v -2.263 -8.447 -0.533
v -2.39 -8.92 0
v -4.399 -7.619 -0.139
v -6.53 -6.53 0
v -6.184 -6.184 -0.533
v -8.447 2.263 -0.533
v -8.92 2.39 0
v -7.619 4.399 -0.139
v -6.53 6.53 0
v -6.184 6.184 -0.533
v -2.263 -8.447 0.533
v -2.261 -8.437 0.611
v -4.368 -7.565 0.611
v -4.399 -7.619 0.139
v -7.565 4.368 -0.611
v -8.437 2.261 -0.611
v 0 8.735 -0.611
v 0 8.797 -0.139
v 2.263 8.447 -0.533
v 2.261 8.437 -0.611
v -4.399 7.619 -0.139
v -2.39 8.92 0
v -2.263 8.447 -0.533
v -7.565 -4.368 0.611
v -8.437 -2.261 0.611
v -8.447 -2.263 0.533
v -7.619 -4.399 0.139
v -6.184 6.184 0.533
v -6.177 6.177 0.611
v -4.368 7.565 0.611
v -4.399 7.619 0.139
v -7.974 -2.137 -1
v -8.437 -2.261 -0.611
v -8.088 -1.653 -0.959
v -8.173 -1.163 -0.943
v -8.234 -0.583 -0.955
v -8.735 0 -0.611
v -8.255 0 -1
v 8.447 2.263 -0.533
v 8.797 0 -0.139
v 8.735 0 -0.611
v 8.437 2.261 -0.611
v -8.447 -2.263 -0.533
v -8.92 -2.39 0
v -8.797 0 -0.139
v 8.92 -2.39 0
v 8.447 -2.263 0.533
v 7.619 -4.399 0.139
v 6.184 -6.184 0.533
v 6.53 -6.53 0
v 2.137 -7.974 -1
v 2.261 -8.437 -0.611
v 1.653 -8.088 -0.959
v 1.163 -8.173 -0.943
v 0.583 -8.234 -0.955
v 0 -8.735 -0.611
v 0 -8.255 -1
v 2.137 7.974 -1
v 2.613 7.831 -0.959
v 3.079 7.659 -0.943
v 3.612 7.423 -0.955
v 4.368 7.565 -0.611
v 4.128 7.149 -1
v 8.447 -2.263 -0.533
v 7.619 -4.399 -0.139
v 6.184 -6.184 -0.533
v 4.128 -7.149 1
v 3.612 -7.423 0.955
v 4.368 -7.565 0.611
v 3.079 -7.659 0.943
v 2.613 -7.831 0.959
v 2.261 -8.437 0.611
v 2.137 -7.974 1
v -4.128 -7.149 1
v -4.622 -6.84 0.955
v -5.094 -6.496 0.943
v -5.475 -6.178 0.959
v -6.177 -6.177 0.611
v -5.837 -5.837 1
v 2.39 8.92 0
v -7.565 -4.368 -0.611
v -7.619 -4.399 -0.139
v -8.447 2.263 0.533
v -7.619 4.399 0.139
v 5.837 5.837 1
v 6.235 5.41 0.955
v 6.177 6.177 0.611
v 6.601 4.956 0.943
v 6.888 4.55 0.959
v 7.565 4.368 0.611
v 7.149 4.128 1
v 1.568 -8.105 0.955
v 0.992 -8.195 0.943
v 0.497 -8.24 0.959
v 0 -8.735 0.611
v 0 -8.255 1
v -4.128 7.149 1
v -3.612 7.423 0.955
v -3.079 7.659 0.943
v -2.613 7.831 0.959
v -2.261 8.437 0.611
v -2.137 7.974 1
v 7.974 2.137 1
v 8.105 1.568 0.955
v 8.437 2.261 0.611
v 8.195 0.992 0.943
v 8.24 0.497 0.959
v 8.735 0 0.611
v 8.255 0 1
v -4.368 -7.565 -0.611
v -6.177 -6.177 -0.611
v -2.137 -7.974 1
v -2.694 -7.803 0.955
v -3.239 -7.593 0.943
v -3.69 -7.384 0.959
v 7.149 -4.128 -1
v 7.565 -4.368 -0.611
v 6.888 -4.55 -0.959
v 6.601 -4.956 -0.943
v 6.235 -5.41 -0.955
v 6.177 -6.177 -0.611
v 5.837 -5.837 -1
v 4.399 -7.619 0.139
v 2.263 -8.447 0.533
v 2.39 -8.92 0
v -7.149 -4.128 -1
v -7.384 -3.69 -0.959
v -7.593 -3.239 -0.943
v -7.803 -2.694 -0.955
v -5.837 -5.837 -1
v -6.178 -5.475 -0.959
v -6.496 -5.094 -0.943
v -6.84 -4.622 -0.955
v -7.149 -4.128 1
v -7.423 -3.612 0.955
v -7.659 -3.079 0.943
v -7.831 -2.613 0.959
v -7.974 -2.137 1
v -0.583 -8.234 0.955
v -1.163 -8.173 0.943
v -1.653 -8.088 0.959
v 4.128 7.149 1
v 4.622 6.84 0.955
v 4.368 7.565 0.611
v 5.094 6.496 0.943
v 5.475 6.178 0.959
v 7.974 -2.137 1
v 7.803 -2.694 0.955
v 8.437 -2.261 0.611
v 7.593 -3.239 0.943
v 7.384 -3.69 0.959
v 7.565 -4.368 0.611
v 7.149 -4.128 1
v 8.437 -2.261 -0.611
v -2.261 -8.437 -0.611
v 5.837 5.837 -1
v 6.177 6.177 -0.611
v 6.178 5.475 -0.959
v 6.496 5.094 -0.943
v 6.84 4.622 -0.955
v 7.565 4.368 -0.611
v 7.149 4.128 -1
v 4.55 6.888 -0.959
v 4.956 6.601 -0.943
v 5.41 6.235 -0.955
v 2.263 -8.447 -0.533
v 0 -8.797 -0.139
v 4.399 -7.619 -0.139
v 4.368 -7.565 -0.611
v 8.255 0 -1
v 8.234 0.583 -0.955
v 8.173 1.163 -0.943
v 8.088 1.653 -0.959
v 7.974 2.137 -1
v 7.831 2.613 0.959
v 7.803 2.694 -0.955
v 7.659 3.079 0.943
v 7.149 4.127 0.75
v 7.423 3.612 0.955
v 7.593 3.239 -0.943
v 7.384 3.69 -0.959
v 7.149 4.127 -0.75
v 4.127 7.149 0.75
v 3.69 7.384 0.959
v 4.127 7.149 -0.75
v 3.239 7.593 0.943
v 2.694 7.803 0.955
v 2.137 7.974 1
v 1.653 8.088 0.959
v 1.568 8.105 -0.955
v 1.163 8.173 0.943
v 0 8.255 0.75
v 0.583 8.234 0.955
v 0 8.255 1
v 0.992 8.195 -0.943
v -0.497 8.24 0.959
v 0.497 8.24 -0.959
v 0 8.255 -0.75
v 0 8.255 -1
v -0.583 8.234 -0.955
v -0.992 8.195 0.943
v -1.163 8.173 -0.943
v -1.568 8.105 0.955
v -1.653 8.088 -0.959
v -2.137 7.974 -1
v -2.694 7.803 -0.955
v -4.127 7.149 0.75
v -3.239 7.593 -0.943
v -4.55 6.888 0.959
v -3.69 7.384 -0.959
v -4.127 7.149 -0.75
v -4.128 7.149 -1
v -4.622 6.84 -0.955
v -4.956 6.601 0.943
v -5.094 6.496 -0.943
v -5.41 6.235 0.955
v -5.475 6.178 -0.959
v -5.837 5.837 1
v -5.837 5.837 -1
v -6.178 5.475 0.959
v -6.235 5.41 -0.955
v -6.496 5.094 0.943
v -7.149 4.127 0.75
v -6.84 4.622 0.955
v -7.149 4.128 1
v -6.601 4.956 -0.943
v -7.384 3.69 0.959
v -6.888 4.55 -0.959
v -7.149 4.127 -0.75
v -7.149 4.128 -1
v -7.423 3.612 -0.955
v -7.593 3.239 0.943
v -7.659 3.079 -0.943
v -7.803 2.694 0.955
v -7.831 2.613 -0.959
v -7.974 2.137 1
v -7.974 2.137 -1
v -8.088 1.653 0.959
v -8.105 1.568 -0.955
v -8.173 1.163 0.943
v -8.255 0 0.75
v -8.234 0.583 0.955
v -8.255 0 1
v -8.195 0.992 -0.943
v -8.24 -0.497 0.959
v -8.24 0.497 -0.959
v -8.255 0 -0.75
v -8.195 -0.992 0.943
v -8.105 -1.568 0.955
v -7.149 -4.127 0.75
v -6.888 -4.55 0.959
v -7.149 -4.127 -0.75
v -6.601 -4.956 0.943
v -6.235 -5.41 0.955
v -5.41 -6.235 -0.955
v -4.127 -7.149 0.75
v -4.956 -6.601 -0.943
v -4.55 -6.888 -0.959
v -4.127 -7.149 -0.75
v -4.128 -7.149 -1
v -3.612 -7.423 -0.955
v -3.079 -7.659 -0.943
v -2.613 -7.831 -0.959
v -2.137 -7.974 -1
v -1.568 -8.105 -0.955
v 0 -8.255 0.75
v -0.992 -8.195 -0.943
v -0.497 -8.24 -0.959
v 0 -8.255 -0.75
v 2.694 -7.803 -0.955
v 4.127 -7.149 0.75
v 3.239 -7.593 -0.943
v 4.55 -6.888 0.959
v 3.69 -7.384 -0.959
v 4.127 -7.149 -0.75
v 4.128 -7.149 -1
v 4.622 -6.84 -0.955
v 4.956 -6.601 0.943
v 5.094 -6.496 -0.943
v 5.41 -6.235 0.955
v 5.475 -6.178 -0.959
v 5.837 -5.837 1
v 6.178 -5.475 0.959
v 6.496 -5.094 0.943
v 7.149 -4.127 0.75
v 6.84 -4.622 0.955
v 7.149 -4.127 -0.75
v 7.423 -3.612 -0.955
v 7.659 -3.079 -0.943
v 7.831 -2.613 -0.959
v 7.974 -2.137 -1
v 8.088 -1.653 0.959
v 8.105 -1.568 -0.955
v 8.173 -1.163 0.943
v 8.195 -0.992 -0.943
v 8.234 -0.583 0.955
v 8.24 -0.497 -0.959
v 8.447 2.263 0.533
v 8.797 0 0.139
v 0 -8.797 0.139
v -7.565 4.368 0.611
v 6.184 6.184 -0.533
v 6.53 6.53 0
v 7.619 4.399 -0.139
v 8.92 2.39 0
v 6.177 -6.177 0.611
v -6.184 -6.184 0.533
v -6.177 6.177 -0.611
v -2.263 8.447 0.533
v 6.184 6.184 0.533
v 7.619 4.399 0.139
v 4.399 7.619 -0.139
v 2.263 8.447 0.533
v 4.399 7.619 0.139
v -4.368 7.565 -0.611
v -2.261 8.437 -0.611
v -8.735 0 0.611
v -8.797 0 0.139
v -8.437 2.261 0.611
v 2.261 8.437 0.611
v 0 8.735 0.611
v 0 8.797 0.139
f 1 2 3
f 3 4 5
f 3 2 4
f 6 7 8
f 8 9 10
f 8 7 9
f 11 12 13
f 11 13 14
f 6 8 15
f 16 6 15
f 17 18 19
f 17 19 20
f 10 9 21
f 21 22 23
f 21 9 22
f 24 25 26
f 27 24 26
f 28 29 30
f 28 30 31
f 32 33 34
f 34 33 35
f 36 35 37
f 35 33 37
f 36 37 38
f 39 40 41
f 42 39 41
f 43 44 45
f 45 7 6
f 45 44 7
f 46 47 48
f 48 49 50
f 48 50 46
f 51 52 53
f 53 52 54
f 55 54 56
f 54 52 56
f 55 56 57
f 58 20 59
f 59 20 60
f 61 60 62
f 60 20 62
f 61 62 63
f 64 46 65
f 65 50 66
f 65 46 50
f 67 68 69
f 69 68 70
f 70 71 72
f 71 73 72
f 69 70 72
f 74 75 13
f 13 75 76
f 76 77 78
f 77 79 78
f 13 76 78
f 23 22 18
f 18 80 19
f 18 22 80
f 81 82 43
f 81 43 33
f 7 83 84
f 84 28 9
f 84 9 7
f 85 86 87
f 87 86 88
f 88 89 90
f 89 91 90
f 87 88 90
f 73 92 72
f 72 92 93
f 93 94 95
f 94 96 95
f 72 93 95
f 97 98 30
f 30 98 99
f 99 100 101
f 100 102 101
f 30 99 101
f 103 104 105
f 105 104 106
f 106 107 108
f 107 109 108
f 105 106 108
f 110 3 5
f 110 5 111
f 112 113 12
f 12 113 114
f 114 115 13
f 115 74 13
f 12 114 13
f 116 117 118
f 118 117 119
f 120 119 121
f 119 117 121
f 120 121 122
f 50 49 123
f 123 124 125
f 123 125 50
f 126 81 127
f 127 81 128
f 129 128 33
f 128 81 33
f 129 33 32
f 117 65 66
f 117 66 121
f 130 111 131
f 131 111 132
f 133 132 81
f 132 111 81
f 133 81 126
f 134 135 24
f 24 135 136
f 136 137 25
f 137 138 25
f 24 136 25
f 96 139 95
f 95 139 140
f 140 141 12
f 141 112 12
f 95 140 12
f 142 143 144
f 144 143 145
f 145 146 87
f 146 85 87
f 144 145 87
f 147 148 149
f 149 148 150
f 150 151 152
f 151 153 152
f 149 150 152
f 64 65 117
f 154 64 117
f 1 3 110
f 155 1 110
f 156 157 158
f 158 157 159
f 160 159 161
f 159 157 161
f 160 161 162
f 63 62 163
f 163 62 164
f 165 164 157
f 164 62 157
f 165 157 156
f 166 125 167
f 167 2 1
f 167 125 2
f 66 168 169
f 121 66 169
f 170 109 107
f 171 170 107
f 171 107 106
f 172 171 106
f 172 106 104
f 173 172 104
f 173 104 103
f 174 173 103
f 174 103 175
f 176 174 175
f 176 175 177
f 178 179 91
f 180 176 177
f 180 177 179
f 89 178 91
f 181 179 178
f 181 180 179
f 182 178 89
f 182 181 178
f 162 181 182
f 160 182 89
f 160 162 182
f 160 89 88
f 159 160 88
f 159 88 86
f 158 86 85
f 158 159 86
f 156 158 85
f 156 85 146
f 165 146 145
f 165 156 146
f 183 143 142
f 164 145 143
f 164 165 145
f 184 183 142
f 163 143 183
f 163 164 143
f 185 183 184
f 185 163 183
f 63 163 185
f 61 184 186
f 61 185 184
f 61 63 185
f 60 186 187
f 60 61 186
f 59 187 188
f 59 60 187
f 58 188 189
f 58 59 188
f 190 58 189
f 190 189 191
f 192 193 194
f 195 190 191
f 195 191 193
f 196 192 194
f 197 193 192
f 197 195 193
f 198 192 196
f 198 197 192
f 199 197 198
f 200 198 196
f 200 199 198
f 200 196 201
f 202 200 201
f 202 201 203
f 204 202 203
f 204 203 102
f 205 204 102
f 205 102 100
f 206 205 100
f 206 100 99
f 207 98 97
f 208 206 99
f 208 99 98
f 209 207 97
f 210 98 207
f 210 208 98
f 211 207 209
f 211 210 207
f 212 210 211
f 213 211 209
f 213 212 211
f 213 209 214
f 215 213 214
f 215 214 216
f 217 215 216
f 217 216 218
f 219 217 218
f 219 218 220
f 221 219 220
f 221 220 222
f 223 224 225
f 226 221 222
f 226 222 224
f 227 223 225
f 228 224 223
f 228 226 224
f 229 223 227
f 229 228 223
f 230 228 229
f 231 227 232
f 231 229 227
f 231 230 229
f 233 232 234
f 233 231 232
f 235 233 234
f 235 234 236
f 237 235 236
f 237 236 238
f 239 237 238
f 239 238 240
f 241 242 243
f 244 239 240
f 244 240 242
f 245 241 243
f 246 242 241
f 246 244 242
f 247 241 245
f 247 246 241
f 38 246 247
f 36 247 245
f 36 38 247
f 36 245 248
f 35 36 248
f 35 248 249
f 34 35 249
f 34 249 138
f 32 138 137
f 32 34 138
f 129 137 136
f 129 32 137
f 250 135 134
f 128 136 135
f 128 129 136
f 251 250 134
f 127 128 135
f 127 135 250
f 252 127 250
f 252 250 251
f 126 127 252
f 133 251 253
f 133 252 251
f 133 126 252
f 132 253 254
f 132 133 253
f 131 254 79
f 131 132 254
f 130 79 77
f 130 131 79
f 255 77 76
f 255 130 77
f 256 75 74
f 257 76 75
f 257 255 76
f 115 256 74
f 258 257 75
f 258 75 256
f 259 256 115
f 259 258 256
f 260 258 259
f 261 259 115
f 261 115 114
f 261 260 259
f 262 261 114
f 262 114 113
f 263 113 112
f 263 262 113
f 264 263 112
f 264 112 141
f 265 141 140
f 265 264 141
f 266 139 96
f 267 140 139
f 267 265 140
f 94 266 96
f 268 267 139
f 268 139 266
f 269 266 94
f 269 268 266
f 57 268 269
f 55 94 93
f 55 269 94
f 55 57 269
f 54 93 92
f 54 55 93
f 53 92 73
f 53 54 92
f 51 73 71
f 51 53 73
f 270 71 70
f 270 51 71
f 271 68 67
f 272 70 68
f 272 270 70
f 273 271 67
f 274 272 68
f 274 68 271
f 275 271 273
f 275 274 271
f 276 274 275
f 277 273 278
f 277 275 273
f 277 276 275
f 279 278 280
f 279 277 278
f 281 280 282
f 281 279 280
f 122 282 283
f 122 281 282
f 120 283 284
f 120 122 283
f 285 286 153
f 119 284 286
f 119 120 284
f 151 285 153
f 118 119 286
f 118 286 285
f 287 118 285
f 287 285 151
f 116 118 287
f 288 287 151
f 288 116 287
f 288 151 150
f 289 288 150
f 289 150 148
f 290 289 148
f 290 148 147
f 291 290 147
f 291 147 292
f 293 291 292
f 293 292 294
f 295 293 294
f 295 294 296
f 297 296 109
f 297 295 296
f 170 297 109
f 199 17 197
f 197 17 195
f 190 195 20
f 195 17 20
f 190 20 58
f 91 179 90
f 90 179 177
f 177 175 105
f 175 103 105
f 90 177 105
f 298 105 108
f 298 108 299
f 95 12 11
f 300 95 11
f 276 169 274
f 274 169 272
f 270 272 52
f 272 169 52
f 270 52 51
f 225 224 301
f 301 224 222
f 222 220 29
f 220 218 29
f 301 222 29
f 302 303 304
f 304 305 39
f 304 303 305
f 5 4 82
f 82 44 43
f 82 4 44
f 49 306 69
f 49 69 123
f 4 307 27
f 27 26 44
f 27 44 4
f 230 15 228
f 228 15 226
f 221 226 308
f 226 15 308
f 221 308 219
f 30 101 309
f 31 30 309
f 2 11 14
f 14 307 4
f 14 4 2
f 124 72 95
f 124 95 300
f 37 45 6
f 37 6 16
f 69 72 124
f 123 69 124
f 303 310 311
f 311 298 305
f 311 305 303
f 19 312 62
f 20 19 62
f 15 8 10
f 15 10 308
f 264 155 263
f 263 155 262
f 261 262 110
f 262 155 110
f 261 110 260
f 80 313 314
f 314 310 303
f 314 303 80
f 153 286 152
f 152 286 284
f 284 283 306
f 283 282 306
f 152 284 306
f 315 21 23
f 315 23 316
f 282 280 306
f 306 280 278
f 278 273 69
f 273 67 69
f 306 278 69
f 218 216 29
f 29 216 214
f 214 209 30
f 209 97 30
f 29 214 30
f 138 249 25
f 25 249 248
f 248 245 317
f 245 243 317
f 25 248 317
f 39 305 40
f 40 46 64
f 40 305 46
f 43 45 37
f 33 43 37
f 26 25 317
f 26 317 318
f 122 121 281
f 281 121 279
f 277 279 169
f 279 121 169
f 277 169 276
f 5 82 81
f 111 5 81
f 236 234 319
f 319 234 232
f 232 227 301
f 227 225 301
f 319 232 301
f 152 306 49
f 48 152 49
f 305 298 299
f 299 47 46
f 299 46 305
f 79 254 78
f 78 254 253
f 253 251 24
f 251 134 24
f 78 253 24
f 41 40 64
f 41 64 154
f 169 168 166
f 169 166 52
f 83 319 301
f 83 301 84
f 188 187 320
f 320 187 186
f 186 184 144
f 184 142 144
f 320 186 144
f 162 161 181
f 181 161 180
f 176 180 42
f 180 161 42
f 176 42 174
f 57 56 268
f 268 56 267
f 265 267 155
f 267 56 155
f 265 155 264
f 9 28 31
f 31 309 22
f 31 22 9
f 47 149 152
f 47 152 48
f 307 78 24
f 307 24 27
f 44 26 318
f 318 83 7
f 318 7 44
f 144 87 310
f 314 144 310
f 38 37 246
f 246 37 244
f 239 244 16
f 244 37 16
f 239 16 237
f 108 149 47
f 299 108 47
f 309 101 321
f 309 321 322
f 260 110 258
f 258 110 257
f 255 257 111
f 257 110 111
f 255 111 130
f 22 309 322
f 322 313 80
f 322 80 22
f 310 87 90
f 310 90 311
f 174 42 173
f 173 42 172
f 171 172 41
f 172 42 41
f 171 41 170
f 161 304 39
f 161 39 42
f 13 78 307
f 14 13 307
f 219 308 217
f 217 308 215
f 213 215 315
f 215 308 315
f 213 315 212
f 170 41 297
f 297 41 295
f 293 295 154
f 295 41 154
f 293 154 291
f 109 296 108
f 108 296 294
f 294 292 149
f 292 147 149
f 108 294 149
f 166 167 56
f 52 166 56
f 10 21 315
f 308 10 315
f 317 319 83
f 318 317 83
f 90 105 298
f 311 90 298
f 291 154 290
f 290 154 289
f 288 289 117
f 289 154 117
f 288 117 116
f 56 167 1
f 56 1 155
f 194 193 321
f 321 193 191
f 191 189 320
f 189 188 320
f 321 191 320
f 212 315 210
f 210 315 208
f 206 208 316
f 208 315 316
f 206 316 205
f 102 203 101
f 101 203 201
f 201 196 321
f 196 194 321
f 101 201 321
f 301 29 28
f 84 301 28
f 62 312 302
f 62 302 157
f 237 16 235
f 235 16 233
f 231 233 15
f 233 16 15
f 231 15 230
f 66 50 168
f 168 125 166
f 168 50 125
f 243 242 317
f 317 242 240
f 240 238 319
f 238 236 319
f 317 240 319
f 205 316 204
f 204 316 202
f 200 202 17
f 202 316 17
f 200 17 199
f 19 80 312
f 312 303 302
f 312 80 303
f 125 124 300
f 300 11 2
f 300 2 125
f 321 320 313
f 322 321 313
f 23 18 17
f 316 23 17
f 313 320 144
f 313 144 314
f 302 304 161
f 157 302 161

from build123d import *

# Parameters (mm, degrees)
F5_W = 0.5
F5_H = 2


with BuildPart() as f3:
    # F3: sweep along a path in F2
    with BuildLine(Plane.XY) as f3_path:
        Line((-8.2, 0), (-7.9205917756, 2.1223161698))
        Line((-7.9205917756, 2.1223161698), (-7.101408311, 4.1))
        Line((-7.101408311, 4.1), (-5.7982756057, 5.7982756057))
        Line((-5.7982756057, 5.7982756057), (-4.1, 7.101408311))
        Line((-4.1, 7.101408311), (-2.1223161698, 7.9205917756))
        Line((-2.1223161698, 7.9205917756), (0, 8.2))
        Line((0, 8.2), (2.1223161698, 7.9205917756))
        Line((2.1223161698, 7.9205917756), (4.1, 7.101408311))
        Line((4.1, 7.101408311), (5.7982756057, 5.7982756057))
        Line((5.7982756057, 5.7982756057), (7.101408311, 4.1))
        Line((7.101408311, 4.1), (7.9205917756, 2.1223161698))
        Line((7.9205917756, 2.1223161698), (8.2, 0))
        Line((8.2, 0), (7.9205917756, -2.1223161698))
        Line((7.9205917756, -2.1223161698), (7.101408311, -4.1))
        Line((7.101408311, -4.1), (5.7982756057, -5.7982756057))
        Line((5.7982756057, -5.7982756057), (4.1, -7.101408311))
        Line((4.1, -7.101408311), (2.1223161698, -7.9205917756))
        Line((2.1223161698, -7.9205917756), (0, -8.2))
        Line((0, -8.2), (-2.1223161698, -7.9205917756))
        Line((-2.1223161698, -7.9205917756), (-4.1, -7.101408311))
        Line((-4.1, -7.101408311), (-5.7982756057, -5.7982756057))
        Line((-5.7982756057, -5.7982756057), (-7.101408311, -4.1))
        Line((-7.101408311, -4.1), (-7.9205917756, -2.1223161698))
        Line((-7.9205917756, -2.1223161698), (-8.2, 0))
    # F1 (on Front) → F3 (sweep)
    with BuildSketch(Plane.XZ):
        Polygon((-8.255, -1), (-8.255, 1), (-8.735039811, 0.6112714258), (-8.8155152209, 0), (-8.735039811, -0.6112714258), align=None)
    sweep(path=f3_path.line, transition=Transition.RIGHT)

    # F6: sweep along a path in F0
    with BuildLine(Plane.XY) as f6_path:
        CenterArc((0, 0), 8.255, 0, 360)
    # F5 (on Front) → F6 (sweep, cut)
    with BuildSketch(Plane.XZ):
        with Locations((-8.005, 0)):
            Rectangle(F5_W, F5_H)
    sweep(path=f6_path.line, mode=Mode.SUBTRACT)

    # F9: sweep along a path in F7
    with BuildLine(Plane.XY) as f9_path:
        Line((-8.255, -2.2119205835), (-8.255, 2.2119205835))
        Line((-8.255, 2.2119205835), (-6.0430794165, 6.0430794165))
        Line((-6.0430794165, 6.0430794165), (-2.2119205835, 8.255))
        Line((-2.2119205835, 8.255), (2.2119205835, 8.255))
        Line((2.2119205835, 8.255), (6.0430794165, 6.0430794165))
        Line((6.0430794165, 6.0430794165), (8.255, 2.2119205835))
        Line((8.255, 2.2119205835), (8.255, -2.2119205835))
        Line((8.255, -2.2119205835), (6.0430794165, -6.0430794165))
        Line((6.0430794165, -6.0430794165), (2.2119205835, -8.255))
        Line((2.2119205835, -8.255), (-2.2119205835, -8.255))
        Line((-2.2119205835, -8.255), (-6.0430794165, -6.0430794165))
        Line((-6.0430794165, -6.0430794165), (-8.255, -2.2119205835))
    # F8 (on Front) → F9 (sweep)
    with BuildSketch(Plane.XZ):
        Polygon((-8.255, -0.75), (-8.255, 0.75), (-8.9203372997, 0), align=None)
    sweep(path=f9_path.line, transition=Transition.RIGHT)


solid = f3.part
